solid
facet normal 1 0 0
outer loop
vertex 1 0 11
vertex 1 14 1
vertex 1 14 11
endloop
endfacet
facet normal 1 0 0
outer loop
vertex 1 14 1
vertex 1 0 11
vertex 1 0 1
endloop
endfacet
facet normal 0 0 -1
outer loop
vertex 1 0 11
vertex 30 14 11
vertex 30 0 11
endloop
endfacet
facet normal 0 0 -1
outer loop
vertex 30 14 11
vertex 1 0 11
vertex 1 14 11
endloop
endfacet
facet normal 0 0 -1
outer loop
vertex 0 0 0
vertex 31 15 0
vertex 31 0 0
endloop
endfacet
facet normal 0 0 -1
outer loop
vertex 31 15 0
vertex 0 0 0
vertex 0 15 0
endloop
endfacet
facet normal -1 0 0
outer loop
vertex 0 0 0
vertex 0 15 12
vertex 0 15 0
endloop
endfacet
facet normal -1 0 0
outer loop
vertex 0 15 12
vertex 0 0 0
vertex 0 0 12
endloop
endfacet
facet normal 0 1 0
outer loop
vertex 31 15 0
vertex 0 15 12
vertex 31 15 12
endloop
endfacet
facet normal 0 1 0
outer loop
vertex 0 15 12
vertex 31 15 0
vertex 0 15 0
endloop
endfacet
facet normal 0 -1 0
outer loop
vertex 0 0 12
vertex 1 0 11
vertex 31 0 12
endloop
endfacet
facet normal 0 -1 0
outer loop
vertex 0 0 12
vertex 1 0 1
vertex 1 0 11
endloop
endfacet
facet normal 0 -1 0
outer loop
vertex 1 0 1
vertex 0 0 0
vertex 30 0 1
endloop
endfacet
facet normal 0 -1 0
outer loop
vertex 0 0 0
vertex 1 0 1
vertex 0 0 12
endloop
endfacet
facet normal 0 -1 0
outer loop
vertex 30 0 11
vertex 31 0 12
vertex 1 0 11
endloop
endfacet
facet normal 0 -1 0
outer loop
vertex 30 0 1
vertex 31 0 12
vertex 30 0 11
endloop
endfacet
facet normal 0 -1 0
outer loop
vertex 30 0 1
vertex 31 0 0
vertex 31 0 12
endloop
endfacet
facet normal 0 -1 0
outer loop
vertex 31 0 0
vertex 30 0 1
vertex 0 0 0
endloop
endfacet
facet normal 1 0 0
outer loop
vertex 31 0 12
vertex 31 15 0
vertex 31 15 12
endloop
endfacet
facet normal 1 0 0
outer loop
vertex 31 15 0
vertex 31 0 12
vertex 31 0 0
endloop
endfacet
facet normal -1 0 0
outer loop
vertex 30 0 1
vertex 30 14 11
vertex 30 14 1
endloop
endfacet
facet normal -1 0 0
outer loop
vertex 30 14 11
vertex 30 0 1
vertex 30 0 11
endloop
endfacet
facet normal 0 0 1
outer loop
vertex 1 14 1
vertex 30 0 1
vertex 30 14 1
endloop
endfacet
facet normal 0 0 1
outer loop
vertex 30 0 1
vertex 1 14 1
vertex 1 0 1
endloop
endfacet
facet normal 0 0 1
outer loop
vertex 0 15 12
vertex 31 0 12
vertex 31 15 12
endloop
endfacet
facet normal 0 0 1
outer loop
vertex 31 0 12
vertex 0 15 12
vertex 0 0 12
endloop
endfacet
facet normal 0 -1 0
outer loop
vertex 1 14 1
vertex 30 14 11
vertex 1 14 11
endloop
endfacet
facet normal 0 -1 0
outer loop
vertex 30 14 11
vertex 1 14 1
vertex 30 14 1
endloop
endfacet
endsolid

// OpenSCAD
union() {
	cube(size = [1, 15, 11]);
	translate(v = [30, 0, 0]) {
		cube(size = [1, 15, 11]);
	}
	cube(size = [31, 15, 1]);
	translate(v = [0, 0, 11]) {
		cube(size = [31, 15, 1]);
	}
	translate(v = [0, 14, 0]) {
		cube(size = [30, 1, 11]);
	}
}
/***********************************************
*********      SolidPython code:      **********
************************************************
 
import solid
from solid import utils

from . import dimensions

def lateral_wall(thickness=1):
    wall = solid.cube([thickness, dimensions.box_y, dimensions.box_z])
    return wall

def back_wall(thickness=1):
    wall = solid.cube([dimensions.box_x, thickness, dimensions.box_z])
    return wall

def bottom_top_wall(thickness=1):
    wall = solid.cube([dimensions.box_x + 1, dimensions.box_y, thickness])
    return wall


def assembly():
    left_wall = lateral_wall()
    right_wall = utils.right(dimensions.box_x)(lateral_wall())
    bottom  = bottom_top_wall()
    top = utils.up(dimensions.box_z)(bottom_top_wall())
    back = utils.forward(dimensions.box_y - 1)(back_wall())
    return left_wall + right_wall + bottom + top + back

if __name__ == "__main__":
    box = assembly()
    solid.scad_render_to_file(box, 'big_box.scad') 
 
************************************************/
